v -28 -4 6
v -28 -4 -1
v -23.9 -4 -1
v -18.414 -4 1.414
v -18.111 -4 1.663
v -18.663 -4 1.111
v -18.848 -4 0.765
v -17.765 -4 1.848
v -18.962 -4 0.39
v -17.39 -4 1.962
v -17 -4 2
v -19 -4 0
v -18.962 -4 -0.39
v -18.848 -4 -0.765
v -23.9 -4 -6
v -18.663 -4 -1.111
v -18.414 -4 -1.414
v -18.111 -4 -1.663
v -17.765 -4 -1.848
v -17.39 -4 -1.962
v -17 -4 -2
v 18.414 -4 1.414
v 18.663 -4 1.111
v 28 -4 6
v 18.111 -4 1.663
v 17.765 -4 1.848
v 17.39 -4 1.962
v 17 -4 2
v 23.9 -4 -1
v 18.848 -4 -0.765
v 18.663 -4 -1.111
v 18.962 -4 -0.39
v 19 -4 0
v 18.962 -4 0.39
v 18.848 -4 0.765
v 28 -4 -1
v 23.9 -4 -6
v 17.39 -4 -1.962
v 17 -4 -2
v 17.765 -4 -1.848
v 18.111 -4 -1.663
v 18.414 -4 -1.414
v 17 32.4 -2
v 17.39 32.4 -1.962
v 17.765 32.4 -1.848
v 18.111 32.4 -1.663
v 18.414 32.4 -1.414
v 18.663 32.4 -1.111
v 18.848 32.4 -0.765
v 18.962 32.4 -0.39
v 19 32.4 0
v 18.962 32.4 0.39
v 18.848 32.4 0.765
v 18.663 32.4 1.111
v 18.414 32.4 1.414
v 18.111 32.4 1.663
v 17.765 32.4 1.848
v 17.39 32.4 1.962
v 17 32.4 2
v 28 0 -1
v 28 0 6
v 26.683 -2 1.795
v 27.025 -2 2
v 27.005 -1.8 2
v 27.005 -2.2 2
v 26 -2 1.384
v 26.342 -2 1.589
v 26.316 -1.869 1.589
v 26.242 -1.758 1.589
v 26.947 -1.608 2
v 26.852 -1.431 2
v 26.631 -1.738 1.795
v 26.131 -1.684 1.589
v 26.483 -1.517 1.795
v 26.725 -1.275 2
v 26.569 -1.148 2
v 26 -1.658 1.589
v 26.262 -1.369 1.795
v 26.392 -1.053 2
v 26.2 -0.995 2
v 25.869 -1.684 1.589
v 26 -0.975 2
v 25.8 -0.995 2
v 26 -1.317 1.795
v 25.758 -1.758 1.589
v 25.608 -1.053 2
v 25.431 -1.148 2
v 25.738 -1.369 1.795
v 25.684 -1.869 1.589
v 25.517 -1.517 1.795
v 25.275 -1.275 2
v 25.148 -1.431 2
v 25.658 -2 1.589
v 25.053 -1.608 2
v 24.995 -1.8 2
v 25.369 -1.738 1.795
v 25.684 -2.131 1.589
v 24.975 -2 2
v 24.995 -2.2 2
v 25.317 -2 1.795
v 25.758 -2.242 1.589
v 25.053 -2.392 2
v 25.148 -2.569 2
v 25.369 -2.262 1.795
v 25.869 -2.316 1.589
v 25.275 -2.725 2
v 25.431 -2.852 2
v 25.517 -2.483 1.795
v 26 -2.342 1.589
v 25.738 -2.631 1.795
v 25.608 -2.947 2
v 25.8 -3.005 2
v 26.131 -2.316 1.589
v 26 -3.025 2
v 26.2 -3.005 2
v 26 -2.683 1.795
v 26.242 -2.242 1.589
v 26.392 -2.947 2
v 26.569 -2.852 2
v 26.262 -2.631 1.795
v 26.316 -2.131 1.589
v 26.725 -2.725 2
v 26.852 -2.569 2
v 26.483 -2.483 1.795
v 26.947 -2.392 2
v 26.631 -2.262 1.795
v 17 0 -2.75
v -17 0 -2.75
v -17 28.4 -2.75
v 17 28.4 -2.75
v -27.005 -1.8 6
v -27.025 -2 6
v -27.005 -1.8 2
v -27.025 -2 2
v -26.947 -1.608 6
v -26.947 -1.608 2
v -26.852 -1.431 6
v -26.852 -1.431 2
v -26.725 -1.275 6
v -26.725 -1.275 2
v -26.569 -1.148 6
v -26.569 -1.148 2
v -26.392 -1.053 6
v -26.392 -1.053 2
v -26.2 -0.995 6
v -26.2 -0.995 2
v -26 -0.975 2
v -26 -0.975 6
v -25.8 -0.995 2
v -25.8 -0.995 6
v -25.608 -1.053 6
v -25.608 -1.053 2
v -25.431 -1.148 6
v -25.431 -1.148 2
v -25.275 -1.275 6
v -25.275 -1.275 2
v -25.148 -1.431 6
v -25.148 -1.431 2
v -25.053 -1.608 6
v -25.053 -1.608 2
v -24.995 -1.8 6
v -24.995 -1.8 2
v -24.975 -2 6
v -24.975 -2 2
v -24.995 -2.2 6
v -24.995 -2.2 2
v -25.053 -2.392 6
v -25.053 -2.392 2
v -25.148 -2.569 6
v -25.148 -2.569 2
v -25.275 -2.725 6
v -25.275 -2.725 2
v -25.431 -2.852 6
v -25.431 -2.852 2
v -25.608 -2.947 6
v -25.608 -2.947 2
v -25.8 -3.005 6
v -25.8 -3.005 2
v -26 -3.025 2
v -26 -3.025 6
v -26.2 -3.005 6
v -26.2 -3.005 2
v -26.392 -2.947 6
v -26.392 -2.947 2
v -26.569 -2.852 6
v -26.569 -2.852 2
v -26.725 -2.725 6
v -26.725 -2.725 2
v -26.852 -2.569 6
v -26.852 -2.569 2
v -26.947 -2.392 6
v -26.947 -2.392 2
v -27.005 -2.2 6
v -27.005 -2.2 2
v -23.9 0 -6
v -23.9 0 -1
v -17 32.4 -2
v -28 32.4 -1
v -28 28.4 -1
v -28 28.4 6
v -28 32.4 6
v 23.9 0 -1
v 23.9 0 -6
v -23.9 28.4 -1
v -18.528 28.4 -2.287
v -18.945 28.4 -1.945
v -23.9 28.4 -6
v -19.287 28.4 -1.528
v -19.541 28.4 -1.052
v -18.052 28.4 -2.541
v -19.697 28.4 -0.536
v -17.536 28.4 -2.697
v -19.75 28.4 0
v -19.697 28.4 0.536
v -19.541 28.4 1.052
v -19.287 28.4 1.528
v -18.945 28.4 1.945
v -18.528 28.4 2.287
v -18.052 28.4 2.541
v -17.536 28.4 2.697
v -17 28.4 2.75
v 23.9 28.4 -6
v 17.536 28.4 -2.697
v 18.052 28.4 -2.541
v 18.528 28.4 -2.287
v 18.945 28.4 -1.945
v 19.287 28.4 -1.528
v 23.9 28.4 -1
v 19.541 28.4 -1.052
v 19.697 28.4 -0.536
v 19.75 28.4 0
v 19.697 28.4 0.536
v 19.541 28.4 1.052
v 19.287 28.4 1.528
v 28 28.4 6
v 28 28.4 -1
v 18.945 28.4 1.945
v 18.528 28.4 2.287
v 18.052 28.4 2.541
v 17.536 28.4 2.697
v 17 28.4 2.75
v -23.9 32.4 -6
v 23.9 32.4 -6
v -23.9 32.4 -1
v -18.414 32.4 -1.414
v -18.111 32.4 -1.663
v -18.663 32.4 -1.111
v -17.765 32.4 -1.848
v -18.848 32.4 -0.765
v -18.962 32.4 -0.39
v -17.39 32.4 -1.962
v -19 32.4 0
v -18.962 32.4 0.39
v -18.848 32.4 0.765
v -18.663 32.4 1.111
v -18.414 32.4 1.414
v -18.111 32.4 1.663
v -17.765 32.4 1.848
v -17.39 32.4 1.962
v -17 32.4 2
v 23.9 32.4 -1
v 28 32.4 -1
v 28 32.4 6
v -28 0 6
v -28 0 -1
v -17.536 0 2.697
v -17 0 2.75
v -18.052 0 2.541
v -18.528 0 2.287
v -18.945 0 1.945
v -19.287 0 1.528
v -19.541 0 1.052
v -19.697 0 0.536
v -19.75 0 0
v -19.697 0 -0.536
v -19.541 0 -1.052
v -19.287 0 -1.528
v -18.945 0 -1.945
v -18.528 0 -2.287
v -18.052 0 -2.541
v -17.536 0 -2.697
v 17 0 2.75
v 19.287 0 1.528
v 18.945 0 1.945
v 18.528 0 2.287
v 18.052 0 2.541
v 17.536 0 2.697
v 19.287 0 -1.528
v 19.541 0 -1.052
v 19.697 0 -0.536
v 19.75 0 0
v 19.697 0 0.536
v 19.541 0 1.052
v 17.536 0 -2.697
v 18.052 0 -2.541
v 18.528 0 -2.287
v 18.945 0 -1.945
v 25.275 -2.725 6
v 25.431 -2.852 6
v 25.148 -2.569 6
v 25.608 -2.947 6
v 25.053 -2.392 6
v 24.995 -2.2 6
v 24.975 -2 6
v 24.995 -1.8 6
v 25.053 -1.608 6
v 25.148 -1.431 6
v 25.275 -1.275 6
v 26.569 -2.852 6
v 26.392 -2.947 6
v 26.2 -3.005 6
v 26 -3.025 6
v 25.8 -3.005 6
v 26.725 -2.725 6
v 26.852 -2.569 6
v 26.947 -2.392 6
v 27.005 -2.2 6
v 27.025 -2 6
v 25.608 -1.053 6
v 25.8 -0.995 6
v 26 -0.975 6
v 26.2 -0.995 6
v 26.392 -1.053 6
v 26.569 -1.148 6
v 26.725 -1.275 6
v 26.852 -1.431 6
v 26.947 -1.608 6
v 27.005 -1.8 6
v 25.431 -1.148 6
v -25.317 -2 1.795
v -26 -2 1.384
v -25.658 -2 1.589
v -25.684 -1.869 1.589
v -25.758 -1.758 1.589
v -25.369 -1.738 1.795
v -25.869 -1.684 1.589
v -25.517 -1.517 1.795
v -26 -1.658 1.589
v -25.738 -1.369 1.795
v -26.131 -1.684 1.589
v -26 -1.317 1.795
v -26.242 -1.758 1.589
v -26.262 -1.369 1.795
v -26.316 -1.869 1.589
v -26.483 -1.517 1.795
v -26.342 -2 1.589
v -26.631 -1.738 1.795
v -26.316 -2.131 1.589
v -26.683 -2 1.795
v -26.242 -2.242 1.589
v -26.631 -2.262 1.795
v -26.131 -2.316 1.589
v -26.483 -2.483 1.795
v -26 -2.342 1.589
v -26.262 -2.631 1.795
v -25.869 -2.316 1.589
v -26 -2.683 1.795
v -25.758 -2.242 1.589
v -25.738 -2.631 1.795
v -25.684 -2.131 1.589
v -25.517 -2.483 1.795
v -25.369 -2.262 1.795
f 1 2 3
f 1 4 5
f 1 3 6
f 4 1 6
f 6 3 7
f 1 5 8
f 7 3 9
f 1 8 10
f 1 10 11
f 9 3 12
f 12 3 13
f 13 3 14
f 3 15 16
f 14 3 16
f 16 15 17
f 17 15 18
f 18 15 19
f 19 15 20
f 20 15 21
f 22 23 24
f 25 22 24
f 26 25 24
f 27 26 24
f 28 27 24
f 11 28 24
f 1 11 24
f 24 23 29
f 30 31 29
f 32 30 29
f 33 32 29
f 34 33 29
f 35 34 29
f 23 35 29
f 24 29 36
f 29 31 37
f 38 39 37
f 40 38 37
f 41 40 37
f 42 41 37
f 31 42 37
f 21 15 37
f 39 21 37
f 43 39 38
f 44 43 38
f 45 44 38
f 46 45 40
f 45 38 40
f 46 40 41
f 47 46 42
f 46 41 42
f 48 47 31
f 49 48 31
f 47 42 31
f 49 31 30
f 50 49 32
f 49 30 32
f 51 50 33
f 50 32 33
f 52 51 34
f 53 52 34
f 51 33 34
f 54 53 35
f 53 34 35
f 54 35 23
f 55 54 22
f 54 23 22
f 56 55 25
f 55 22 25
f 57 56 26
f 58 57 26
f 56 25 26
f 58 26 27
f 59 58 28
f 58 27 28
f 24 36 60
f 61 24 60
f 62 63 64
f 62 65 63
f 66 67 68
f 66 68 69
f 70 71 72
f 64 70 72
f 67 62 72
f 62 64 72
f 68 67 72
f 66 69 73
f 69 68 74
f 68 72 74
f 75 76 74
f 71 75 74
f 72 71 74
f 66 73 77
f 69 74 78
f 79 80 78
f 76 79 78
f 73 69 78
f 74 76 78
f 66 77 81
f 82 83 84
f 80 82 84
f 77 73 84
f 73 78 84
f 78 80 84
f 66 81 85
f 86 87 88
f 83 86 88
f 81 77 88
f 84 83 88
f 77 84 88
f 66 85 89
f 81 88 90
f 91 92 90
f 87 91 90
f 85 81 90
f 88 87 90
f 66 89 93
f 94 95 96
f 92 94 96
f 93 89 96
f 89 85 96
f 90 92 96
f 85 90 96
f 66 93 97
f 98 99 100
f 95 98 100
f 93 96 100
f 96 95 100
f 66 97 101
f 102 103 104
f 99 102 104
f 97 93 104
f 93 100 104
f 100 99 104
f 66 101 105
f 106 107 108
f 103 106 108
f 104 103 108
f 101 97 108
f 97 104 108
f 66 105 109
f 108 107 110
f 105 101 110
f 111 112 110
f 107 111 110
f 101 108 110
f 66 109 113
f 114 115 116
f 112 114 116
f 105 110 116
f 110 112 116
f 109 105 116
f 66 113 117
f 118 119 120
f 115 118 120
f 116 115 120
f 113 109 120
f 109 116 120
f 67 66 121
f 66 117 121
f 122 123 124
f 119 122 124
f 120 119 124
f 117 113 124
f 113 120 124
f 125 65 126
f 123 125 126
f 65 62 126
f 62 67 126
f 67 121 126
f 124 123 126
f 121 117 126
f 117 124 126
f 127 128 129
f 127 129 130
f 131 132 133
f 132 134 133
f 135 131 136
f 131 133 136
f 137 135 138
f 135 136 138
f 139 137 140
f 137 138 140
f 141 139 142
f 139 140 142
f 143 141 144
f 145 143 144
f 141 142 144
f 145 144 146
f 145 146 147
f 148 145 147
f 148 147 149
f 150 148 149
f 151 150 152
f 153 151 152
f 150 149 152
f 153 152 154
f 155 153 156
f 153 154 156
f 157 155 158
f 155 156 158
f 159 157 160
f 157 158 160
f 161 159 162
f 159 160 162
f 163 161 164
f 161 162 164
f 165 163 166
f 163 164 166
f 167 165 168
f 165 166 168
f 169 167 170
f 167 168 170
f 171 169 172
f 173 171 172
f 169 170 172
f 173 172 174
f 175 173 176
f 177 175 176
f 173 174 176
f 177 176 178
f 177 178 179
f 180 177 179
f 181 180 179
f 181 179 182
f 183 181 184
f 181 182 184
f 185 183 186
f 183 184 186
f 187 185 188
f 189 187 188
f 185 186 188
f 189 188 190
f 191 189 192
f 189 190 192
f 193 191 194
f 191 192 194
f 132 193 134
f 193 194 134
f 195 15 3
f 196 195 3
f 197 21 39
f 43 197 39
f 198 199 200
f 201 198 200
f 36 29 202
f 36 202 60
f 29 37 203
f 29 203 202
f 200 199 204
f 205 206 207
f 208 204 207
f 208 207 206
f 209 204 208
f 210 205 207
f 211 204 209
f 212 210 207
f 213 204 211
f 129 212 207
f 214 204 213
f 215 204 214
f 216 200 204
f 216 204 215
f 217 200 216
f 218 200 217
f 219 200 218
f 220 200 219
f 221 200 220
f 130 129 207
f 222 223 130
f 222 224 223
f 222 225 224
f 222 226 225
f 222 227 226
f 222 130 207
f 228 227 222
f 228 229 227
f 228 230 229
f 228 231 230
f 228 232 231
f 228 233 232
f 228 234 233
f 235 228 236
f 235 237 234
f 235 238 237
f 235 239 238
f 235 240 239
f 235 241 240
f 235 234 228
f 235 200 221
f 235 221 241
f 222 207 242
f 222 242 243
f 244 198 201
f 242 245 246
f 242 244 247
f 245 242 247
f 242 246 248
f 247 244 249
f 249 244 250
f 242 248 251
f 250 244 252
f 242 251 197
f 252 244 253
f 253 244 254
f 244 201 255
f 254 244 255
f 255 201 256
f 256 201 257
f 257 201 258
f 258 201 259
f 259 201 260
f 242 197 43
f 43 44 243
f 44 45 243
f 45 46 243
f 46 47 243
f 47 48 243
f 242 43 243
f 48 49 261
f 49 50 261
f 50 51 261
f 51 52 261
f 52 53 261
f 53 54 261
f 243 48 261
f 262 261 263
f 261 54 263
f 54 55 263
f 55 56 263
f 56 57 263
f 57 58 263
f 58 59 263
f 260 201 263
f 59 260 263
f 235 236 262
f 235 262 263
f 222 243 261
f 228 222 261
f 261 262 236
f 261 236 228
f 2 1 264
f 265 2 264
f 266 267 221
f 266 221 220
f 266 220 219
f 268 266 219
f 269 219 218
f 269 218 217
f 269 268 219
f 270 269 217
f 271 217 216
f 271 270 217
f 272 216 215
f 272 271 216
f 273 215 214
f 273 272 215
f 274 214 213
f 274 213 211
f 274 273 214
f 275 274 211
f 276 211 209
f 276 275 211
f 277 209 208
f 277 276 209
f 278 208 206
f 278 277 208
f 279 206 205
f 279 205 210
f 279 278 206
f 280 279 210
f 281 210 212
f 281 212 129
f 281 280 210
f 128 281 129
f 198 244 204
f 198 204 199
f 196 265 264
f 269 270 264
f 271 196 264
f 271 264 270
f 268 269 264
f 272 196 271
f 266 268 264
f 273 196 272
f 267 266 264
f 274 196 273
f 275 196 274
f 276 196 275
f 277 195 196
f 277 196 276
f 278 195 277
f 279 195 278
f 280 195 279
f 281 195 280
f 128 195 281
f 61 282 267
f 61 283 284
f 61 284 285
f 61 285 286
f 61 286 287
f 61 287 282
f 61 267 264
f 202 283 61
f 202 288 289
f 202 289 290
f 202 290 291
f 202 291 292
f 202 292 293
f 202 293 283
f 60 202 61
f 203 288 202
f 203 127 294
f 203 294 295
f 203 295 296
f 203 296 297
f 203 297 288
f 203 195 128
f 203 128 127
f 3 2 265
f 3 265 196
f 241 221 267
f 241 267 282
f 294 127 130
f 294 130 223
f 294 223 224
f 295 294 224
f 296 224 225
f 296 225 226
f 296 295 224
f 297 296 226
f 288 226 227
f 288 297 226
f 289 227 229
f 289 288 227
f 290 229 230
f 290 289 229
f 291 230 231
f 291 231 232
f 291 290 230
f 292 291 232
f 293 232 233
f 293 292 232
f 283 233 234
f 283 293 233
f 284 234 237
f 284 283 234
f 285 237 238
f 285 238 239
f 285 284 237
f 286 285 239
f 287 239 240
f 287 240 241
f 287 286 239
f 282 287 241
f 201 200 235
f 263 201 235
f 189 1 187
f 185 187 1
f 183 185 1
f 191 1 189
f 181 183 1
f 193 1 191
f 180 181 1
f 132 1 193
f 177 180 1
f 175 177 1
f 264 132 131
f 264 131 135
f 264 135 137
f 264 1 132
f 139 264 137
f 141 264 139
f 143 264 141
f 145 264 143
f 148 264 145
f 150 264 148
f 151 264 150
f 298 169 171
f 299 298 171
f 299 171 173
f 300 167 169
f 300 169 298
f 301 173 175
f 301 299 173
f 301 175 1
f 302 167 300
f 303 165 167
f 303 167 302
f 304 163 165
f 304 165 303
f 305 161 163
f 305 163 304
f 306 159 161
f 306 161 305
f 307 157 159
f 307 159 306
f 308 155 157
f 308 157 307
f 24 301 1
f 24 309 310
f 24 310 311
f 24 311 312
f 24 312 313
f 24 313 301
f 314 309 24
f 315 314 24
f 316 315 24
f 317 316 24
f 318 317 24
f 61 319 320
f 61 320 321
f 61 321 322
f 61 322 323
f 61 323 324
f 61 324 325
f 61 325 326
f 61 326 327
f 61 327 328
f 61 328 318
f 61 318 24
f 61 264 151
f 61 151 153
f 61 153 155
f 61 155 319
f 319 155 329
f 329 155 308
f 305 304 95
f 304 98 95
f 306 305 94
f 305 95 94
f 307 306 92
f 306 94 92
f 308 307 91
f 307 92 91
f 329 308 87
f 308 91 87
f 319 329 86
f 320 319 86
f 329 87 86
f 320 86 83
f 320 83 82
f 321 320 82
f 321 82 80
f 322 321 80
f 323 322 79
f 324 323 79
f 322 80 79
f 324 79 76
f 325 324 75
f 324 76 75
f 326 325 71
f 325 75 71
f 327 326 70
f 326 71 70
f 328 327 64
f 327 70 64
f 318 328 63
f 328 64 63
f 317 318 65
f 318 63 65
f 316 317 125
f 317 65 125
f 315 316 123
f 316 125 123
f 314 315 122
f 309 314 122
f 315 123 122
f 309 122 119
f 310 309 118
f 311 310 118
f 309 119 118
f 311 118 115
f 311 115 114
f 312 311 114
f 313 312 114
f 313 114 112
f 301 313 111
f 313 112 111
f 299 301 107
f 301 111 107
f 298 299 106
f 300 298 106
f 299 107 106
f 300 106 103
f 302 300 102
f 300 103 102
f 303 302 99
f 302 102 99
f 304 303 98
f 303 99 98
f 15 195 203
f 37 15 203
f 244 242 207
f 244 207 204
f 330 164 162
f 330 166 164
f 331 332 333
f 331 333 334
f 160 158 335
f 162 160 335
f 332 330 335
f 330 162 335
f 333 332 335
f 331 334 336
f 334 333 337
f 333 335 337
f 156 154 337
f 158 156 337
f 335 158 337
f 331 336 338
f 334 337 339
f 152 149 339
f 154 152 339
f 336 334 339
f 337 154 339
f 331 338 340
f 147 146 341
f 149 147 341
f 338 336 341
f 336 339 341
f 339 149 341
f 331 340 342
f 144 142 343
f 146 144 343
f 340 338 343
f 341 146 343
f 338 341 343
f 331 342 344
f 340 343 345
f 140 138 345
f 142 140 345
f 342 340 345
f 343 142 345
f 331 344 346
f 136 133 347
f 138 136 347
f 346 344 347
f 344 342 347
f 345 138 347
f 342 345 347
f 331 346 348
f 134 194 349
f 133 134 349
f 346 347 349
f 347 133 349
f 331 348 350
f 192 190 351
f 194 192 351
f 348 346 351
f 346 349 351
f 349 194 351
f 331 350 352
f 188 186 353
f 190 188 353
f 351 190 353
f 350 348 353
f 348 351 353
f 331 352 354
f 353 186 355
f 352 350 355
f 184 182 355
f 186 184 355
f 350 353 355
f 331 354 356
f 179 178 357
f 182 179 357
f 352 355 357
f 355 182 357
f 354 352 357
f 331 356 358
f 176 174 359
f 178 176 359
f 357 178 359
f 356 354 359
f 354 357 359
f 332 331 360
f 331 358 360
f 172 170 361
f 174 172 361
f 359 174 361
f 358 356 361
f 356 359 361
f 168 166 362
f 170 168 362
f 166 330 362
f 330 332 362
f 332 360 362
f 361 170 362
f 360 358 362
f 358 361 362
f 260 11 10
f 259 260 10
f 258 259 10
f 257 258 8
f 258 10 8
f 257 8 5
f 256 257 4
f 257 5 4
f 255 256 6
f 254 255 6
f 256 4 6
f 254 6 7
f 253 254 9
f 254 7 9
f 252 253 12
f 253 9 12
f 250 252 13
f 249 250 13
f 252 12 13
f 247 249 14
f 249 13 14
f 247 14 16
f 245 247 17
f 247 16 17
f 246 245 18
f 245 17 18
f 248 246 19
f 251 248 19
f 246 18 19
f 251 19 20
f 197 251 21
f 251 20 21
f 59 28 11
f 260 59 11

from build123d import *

# Parameters (mm, degrees)
SKETCH1_W                        = 56
SKETCH1_H                        = 8.750000002
BOSS_EXTRUDE1_DEPTH              = 4
BOSS_EXTRUDE2_DEPTH              = 28.4
SKETCH3_W                        = 56
SKETCH3_H                        = 12
BOSS_EXTRUDE3_DEPTH              = 4
SKETCH4_W                        = 56
SKETCH4_H                        = 4
BOSS_EXTRUDE4_DEPTH              = 3.249999998
CUT_EXTRUDE1_REACH               = 38.4
SKETCH5_W                        = 4.100000004
SKETCH5_H                        = 5
CUT_EXTRUDE2_REACH               = 38.4
SKETCH6_W                        = 4.100000004
SKETCH6_H                        = 5.000000001
SKETCH7_W                        = 4.100000004
SKETCH7_H                        = 5.000000001
CUT_EXTRUDE3_DEPTH               = 37.4
SKETCH8_W                        = 4.100000004
SKETCH8_H                        = 5
CUT_EXTRUDE4_DEPTH               = 37.4
CUT_EXTRUDE5_DEPTH               = 37.4
F_2_05_2_05_DIAMETER_HOLE1_D     = 2.05
F_2_05_2_05_DIAMETER_HOLE1_DEPTH = 4
F_2_05_2_05_DIAMETER_HOLE1_TIP   = 0.615882135


with BuildPart() as part:
    # Sketch1 → Boss-Extrude1 (new body)
    with BuildSketch(Plane(origin=(0, 0, 0), x_dir=(1, 0, 0), z_dir=(0, 1, 0))):
        with Locations((0, 1.624999999)):
            Rectangle(SKETCH1_W, SKETCH1_H)
    extrude(amount=-BOSS_EXTRUDE1_DEPTH)

    # Sketch2 → Boss-Extrude2 (add)
    with BuildSketch(Plane(origin=(0, 0, 0), x_dir=(-1, 0, 0), z_dir=(0, 1, 0))):
        with BuildLine():
            Line((-17, 2.75), (17, 2.75))
            ThreePointArc((17, 2.75), (19.75, 0), (17, -2.75))
            Line((17, -2.75), (-17, -2.75))
            ThreePointArc((-17, -2.75), (-19.75, 0), (-17, 2.75))
        make_face()
    extrude(amount=BOSS_EXTRUDE2_DEPTH)

    # Sketch3 → Boss-Extrude3 (add)
    with BuildSketch(Plane.XZ.offset(-28.4)):
        Rectangle(SKETCH3_W, SKETCH3_H)
    extrude(amount=-BOSS_EXTRUDE3_DEPTH)

    # Sketch4 → Boss-Extrude4 (add)
    with BuildSketch(Plane.XY.offset(2.750000002)):
        with Locations((0, -2)):
            Rectangle(SKETCH4_W, SKETCH4_H)
    extrude(amount=BOSS_EXTRUDE4_DEPTH)

    # Sketch5 → Cut-Extrude1 (cut, up to next)
    with BuildSketch(Plane(origin=(0, 32.4, 0), x_dir=(-1, 0, 0), z_dir=(0, 1, 0)), mode=Mode.PRIVATE) as cut_extrude1_sk1:
        with Locations((25.949999998, -3.5)):
            Rectangle(SKETCH5_W, SKETCH5_H)
    cut_extrude1_tool1 = extrude(cut_extrude1_sk1.sketch, amount=-CUT_EXTRUDE1_REACH, mode=Mode.PRIVATE) & part.part
    add(cut_extrude1_tool1.solids().sort_by_distance((-25.95, 32.4, -3.5))[0], mode=Mode.SUBTRACT)

    # Sketch6 → Cut-Extrude2 (cut, up to next)
    with BuildSketch(Plane(origin=(0, 32.4, 0), x_dir=(-1, 0, 0), z_dir=(0, 1, 0)), mode=Mode.PRIVATE) as cut_extrude2_sk1:
        with Locations((-25.949999998, -3.499999999)):
            Rectangle(SKETCH6_W, SKETCH6_H)
    cut_extrude2_tool1 = extrude(cut_extrude2_sk1.sketch, amount=-CUT_EXTRUDE2_REACH, mode=Mode.PRIVATE) & part.part
    add(cut_extrude2_tool1.solids().sort_by_distance((25.95, 32.4, -3.5))[0], mode=Mode.SUBTRACT)

    # Sketch7 → Cut-Extrude3 (cut, through all)
    with BuildSketch(Plane.XZ.offset(4)):
        with Locations((25.949999998, -3.499999999)):
            Rectangle(SKETCH7_W, SKETCH7_H)
    extrude(amount=-CUT_EXTRUDE3_DEPTH, mode=Mode.SUBTRACT)

    # Sketch8 → Cut-Extrude4 (cut, through all)
    with BuildSketch(Plane.XZ.offset(4)):
        with Locations((-25.949999998, -3.5)):
            Rectangle(SKETCH8_W, SKETCH8_H)
    extrude(amount=-CUT_EXTRUDE4_DEPTH, mode=Mode.SUBTRACT)

    # Sketch9 → Cut-Extrude5 (cut, through all)
    with BuildSketch(Plane.XZ.offset(4)):
        with BuildLine():
            Line((-17, -2.000000002), (17, -2.000000002))
            ThreePointArc((17, -2.000000002), (19.000000002, 0), (17, 2.000000002))
            Line((17, 2.000000002), (-17, 2.000000002))
            ThreePointArc((-17, 2.000000002), (-19.000000002, 0), (-17, -2.000000002))
        make_face()
    extrude(amount=-CUT_EXTRUDE5_DEPTH, mode=Mode.SUBTRACT)

    # Ø2.05 (2.05) Diameter Hole1
    with Locations(Plane.XY.offset(6)):
        with Locations((26, -2), (-26, -2)):
            Hole(F_2_05_2_05_DIAMETER_HOLE1_D / 2, depth=F_2_05_2_05_DIAMETER_HOLE1_DEPTH)
            with Locations((0, 0, -(F_2_05_2_05_DIAMETER_HOLE1_DEPTH + F_2_05_2_05_DIAMETER_HOLE1_TIP / 2))):  # 118° drill point
                Cone(0, F_2_05_2_05_DIAMETER_HOLE1_D / 2, F_2_05_2_05_DIAMETER_HOLE1_TIP, mode=Mode.SUBTRACT)


solid = part.part
